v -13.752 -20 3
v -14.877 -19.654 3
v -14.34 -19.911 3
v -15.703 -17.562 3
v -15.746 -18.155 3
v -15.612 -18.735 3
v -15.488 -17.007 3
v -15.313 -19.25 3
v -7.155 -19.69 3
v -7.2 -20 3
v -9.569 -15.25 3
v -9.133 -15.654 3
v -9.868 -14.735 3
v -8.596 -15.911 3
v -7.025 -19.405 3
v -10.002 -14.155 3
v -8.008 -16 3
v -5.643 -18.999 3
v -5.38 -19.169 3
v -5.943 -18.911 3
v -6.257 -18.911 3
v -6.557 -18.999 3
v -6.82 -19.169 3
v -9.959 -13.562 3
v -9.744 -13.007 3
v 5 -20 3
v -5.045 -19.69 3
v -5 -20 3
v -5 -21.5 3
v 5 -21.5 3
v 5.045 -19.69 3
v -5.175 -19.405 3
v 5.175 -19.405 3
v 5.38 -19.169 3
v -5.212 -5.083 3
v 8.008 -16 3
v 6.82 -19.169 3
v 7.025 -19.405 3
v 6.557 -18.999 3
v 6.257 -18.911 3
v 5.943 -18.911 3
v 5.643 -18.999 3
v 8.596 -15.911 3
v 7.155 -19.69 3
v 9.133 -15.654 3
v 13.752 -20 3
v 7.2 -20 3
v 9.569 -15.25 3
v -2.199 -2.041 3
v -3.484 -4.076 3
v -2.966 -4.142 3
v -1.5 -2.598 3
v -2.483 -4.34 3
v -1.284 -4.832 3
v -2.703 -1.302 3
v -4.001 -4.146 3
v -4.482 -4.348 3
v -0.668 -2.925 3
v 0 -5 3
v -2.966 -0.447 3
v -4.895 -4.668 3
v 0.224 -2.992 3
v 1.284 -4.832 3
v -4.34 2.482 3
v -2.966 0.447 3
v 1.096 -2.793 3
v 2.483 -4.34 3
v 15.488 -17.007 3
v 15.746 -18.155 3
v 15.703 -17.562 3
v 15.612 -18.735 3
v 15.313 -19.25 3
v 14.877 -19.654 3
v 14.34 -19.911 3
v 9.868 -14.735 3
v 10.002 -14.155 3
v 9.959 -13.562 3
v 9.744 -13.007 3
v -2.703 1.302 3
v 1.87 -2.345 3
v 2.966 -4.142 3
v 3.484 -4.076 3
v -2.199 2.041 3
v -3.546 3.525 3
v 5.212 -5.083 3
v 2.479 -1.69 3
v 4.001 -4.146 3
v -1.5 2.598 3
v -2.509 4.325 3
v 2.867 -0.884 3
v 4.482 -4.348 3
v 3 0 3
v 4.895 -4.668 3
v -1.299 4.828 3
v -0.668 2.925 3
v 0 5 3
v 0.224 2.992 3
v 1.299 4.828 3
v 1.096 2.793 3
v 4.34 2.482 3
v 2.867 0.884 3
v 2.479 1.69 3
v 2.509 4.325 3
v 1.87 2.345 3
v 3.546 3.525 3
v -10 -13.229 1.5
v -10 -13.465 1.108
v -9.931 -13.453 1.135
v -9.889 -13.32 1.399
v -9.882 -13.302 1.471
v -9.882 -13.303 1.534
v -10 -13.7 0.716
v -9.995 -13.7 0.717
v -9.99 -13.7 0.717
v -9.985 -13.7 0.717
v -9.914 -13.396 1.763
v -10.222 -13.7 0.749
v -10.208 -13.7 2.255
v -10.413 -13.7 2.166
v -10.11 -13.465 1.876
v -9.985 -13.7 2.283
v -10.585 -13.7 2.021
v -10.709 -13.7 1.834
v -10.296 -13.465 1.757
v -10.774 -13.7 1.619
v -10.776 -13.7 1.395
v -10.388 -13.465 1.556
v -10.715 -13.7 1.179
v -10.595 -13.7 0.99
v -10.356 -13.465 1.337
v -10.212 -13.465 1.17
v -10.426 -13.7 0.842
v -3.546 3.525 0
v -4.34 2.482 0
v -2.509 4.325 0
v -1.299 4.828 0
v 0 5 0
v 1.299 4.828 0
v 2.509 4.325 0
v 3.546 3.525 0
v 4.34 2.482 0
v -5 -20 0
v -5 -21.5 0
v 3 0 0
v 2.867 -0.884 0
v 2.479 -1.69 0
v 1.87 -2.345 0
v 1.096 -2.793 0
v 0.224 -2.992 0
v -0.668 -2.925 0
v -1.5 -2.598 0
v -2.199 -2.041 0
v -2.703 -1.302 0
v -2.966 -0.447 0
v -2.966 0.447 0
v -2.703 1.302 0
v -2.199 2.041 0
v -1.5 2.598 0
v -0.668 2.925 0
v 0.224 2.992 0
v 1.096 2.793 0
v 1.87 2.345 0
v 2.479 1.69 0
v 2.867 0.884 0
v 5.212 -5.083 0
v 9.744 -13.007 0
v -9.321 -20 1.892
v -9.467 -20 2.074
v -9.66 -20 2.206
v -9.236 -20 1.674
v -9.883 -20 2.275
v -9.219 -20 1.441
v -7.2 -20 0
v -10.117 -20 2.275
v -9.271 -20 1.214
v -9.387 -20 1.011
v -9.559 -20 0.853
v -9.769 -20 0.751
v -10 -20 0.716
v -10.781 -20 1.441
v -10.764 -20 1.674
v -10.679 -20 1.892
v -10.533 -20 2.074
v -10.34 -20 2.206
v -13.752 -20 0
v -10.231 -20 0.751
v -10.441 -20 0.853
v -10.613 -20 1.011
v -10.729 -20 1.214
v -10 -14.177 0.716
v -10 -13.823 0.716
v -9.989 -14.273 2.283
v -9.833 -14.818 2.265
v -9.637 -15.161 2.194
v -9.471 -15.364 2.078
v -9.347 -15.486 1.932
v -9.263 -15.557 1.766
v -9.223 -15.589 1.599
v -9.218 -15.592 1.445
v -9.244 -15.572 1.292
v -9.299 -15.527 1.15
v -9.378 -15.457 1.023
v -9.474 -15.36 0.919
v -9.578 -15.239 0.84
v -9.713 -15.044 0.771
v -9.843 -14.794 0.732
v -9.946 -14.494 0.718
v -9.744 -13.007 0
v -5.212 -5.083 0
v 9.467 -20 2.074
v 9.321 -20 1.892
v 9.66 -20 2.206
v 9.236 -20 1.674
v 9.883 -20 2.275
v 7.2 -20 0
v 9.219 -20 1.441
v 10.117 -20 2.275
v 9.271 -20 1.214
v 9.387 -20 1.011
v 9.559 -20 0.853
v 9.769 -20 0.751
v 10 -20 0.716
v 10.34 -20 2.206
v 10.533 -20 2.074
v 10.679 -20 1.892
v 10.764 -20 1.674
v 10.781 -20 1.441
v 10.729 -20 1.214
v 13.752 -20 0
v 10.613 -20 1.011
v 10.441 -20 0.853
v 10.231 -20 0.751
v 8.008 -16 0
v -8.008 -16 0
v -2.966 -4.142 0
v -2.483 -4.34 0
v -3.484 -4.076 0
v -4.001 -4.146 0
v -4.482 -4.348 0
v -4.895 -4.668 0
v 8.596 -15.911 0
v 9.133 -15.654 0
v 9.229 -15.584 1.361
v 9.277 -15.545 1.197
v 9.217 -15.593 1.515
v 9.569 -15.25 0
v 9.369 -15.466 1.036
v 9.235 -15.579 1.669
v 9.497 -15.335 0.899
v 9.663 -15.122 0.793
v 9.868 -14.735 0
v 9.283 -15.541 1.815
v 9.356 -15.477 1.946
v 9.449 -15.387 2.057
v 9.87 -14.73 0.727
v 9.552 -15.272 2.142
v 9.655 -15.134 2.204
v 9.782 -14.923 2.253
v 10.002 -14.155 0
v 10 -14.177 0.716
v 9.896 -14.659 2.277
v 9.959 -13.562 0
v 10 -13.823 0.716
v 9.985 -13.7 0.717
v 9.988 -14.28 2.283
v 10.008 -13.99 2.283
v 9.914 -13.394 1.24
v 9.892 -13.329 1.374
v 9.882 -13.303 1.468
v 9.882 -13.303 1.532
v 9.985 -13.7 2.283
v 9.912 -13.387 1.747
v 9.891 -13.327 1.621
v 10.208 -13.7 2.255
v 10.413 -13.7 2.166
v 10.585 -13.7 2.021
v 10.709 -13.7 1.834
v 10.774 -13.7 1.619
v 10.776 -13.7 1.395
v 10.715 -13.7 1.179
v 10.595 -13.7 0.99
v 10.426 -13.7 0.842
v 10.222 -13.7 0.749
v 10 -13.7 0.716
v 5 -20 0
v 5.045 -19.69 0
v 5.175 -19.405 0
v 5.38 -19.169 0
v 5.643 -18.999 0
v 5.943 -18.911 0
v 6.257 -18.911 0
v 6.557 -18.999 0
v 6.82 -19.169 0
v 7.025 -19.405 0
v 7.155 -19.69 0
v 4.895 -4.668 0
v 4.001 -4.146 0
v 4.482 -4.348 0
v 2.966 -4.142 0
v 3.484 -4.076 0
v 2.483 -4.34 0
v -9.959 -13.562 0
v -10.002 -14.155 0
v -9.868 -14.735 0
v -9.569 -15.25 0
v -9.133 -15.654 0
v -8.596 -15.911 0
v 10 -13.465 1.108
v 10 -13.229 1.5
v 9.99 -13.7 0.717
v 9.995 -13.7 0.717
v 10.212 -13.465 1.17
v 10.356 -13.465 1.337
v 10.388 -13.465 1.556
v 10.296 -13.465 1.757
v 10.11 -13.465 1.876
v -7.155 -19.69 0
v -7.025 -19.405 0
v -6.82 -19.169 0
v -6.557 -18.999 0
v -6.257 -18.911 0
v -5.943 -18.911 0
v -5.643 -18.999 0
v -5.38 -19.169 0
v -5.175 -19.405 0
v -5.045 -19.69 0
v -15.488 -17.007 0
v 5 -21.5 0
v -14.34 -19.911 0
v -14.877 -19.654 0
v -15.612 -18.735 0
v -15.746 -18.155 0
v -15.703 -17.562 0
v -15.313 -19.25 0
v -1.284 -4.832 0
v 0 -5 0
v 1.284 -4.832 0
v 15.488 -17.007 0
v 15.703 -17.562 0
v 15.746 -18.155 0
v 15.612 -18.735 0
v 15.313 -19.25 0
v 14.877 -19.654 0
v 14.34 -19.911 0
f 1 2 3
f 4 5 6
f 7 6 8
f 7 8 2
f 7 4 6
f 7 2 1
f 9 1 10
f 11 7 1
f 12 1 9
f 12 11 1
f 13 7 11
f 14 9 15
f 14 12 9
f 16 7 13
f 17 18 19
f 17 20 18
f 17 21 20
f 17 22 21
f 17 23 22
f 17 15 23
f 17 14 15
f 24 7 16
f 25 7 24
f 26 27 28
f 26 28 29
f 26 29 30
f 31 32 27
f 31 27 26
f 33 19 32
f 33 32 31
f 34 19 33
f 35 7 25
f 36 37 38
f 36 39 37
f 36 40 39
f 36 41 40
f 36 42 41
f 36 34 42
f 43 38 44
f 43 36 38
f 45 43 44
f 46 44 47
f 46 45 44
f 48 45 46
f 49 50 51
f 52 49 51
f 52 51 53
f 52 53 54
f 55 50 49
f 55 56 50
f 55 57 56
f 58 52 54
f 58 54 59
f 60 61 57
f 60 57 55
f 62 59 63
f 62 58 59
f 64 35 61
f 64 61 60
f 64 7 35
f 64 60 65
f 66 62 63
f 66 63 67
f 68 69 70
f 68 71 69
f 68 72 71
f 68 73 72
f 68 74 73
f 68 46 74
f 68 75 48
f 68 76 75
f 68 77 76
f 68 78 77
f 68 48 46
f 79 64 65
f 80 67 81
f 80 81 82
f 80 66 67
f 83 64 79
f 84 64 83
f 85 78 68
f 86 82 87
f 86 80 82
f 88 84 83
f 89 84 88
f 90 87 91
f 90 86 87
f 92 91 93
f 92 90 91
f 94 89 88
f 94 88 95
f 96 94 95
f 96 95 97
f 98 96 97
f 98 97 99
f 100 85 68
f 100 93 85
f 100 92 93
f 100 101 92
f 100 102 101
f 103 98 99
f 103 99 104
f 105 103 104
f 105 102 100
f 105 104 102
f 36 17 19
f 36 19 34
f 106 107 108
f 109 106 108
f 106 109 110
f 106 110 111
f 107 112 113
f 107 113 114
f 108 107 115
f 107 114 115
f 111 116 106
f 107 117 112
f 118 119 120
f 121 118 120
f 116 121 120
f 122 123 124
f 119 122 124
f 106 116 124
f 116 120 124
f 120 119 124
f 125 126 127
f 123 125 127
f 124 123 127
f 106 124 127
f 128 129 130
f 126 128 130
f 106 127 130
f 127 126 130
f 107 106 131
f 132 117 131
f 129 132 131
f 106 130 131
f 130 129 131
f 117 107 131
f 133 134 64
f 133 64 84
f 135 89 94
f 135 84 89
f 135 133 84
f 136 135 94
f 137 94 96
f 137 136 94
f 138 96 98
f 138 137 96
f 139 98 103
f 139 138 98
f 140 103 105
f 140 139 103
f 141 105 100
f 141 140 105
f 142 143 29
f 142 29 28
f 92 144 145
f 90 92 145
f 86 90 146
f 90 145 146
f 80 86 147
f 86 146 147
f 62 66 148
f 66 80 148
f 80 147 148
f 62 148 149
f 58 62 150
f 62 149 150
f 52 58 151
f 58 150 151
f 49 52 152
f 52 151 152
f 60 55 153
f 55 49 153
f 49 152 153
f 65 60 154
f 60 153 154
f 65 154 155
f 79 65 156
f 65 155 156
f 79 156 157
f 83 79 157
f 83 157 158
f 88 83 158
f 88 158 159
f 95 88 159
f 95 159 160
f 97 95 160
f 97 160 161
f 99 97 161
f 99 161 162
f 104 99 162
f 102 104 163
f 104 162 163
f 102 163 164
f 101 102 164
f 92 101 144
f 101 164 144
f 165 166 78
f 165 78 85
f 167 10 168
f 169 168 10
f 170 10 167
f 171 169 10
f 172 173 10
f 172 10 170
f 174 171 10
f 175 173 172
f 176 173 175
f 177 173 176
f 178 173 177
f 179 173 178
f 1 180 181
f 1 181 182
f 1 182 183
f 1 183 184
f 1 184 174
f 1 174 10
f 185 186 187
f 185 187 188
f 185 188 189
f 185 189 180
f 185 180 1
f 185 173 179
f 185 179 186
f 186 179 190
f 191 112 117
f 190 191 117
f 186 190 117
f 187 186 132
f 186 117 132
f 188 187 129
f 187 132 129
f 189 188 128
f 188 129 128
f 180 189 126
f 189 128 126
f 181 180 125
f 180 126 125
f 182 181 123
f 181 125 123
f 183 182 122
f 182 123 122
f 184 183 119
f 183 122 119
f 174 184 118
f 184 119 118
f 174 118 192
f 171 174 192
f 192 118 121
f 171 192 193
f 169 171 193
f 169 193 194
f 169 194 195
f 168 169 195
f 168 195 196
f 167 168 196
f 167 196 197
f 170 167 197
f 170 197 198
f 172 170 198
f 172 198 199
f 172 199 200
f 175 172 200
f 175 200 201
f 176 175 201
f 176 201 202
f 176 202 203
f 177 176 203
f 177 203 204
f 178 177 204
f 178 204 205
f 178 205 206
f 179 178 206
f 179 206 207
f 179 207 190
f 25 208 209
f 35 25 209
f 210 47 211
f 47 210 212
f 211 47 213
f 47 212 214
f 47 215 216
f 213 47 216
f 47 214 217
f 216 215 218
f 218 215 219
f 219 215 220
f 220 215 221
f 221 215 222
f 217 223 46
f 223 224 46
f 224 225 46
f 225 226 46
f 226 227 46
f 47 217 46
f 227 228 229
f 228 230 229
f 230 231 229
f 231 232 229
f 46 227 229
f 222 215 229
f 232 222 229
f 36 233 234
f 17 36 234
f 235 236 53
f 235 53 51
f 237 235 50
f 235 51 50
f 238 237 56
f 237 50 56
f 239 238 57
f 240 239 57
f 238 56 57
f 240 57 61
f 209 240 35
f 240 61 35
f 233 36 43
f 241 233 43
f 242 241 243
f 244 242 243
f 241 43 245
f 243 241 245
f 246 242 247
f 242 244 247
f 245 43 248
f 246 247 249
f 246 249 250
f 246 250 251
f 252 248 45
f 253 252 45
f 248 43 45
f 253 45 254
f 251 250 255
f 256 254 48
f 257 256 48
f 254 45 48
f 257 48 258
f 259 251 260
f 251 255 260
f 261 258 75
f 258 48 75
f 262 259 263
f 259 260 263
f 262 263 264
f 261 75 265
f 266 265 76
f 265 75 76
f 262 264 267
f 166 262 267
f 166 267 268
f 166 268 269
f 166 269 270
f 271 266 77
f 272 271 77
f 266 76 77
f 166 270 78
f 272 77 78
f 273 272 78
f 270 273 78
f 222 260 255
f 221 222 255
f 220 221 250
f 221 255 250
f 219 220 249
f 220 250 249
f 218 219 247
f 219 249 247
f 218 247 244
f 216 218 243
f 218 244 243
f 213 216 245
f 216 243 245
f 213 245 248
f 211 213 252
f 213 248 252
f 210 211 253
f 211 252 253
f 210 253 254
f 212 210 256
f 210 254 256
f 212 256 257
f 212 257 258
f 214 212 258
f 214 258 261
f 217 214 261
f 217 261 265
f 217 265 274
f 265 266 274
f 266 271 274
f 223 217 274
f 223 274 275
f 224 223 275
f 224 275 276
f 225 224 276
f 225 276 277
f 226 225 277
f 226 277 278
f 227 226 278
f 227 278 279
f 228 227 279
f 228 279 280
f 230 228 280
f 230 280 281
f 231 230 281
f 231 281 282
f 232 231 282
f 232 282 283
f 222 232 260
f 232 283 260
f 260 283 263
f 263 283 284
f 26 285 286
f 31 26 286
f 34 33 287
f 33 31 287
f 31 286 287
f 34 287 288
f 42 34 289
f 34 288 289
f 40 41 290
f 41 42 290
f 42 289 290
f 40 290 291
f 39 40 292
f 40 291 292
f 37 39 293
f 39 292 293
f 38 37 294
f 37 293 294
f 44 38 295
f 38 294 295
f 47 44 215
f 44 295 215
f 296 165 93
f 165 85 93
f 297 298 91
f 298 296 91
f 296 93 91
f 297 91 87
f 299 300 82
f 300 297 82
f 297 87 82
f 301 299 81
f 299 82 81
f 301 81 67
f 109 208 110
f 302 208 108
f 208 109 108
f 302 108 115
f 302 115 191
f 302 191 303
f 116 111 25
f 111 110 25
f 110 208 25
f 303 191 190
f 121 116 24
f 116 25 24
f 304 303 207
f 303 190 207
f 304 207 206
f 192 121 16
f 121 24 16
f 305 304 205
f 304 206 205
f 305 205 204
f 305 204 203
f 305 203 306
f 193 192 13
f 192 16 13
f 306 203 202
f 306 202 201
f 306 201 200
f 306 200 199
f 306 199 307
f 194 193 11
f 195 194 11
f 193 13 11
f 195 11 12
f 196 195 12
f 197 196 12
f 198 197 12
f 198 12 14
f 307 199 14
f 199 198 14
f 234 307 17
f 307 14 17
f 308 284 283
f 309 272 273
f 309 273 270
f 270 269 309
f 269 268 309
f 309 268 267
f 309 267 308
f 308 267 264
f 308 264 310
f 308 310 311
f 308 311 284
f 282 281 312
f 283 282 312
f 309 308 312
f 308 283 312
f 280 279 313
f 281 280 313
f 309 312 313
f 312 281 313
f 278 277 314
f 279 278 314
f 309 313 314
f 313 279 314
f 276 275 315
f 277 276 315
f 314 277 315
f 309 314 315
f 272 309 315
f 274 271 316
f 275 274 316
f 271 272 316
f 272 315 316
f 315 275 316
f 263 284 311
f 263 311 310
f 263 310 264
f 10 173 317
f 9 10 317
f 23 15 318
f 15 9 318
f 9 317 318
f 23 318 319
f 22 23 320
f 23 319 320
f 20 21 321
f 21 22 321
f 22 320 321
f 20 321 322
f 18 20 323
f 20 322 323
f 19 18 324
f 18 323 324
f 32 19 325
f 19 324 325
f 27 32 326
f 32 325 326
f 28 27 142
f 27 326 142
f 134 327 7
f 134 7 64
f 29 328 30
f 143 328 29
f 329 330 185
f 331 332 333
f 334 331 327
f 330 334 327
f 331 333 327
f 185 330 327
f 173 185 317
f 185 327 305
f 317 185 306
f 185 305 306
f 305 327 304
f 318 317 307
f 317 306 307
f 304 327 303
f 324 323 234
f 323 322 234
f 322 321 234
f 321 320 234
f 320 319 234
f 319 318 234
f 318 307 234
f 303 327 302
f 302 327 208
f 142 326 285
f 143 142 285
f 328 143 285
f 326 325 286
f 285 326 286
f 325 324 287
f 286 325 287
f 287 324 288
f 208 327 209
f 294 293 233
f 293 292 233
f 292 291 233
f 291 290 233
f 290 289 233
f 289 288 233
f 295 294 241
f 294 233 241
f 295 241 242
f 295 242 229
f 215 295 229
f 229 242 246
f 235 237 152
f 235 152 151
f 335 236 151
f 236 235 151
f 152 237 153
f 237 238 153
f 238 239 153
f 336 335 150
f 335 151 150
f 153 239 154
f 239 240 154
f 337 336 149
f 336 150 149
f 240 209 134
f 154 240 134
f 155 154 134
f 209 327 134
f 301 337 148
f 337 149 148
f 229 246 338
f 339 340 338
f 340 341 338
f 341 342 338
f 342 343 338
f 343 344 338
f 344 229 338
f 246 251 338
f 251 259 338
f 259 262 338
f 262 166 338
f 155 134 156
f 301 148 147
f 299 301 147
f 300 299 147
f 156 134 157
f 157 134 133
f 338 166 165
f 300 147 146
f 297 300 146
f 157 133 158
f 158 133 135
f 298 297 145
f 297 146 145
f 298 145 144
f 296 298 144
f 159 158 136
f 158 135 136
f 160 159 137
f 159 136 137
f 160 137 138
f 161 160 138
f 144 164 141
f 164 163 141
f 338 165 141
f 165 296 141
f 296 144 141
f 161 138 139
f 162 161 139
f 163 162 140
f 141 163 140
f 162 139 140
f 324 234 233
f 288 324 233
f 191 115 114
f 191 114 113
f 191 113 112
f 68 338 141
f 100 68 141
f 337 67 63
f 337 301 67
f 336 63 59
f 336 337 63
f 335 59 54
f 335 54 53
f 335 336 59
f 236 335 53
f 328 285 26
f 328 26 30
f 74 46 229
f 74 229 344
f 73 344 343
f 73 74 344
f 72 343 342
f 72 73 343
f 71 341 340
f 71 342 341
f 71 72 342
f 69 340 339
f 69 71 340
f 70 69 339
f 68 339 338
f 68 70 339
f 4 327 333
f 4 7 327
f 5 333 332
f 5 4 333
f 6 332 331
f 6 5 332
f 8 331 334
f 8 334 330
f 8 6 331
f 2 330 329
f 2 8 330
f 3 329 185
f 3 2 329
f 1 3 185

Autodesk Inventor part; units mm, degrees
ref_plane "YZ Plane" through (0, 0, 0) normal (1, 0, 0) x (0, 1, 0)
ref_plane "XZ Plane" through (0, 0, 0) normal (0, 1, 0) x (-1, 0, 0)
ref_plane "XY Plane" through (0, 0, 0) normal (0, 0, 1) x (1, 0, 0)
sketch "スケッチ1" plane through (0, 0, 0) normal (0, 0, 1) x (1, 0, 0)
  circle A0 centre (0, 0) radius 3
  circle A1 centre (0, 0) radius 5
  line L0 (-5, -20) -> (5, -20)
  line L1 (5, -20) -> (5, -21.5)
  line L2 (5, -21.5) -> (-5, -21.5)
  line L3 (-5, -21.5) -> (-5, -20)
  circle A2 centre (-6.1, -20) radius 1.1
  line L4 (0, 0) -> (0, -20) construction
  circle A3 centre (6.1, -20) radius 1.1
  line L5 (-7.2, -20) -> (-17.2, -20)
  line L6 (-17.2, -20) -> (-4.3402, 2.4825)
  line L7 (7.2, -20) -> (17.2, -20)
  line L8 (17.2, -20) -> (4.3402, 2.4825)
  point P0 (0, -21.5)
  point P1 (4.3402, 2.4825)
  dimension "d1" = 10
  dimension "d0" = 6
  dimension "d2" = 10
  dimension "d3" = 1.5
  dimension "d4" = 2.2
  dimension "d5" = 20
  dimension "d6" = 10
extrude "押し出し1" add sketch "スケッチ1" along normal blind 3 contours A1 | A1 L8 L7 A3 L0 A2 L5 L6 | L1 L2 L3 L0
fillet "フィレット1" radius 2 2 edges at (-17.2, -20, 1.5) (17.2, -20, 1.5)
sketch "スケッチ3" plane through (0, 0, 0) normal (0, 0, -1) x (-1, 0, 0)
  arc A0 (-15.488, -17.007) -> (-13.752, -20) centre (-13.752, -18) ccw projected
  line L0 (-7.2, -20) -> (-13.752, -20) projected
  arc A1 (-5, -20) -> (-7.2, -20) centre (-6.1, -20) ccw projected
  line L1 (-5, -21.5) -> (-5, -20) projected
  line L2 (5, -21.5) -> (-5, -21.5) projected
  line L3 (5, -20) -> (5, -21.5) projected
  arc A2 (7.2, -20) -> (5, -20) centre (6.1, -20) ccw projected
  line L4 (13.752, -20) -> (7.2, -20) projected
  arc A3 (13.752, -20) -> (15.488, -17.007) centre (13.752, -18) ccw projected
  line L5 (4.3402, 2.4825) -> (15.488, -17.007) projected
  arc A4 (4.3402, 2.4825) -> (-4.3402, 2.4825) centre (0, 0) ccw projected
  line L6 (-15.488, -17.007) -> (-4.3402, 2.4825) projected
  circle A5 centre (0, 0) radius 3 projected
  line L7 (-11.4559, -16) -> (11.4559, -16)
  line L8 (11.4559, -16) -> (4.0113, -2.9848)
  line L9 (-11.4559, -16) -> (-4.0113, -2.9848)
  line L10 (-15.488, -17.007) -> (-4.3402, 2.4825) projected
  circle A6 centre (0, 0) radius 5
  line L11 (5, -21.5) -> (-5, -21.5) projected
  arc A7 (4.3402, 2.4825) -> (-4.3402, 2.4825) centre (0, 0) ccw projected
  point P0 (0, -21.5)
  point P1 (0, -16)
  point P2 (0, -21.5)
  dimension "d19" = 4
  dimension "d20" = 3
extrude "押し出し2" cut sketch "スケッチ3" against normal through all contours A6 L8 L7 L9
fillet "フィレット2" radius 2 4 edges at (-4.0113, -2.9848, 1.5) (4.0113, -2.9848, 1.5) (-11.4559, -16, 1.5) (11.4559, -16, 1.5)
sketch "スケッチ2" plane through (-17.2, -20, 0) normal (0, -1, 0) x (1, 0, 0)
  line L0 (12.2, 0) -> (12.2, 3) projected
  line L1 (22.2, 0) -> (22.2, 3) projected
  point P0 (17.2, 0)
  point P1 (7.2, 1.5)
  point P2 (27.2, 1.5)
  point P3 (12.2, 1.5)
  point P4 (22.2, 1.5)
  point P5 (12.2, 1.5)
  point P6 (22.2, 1.5)
  dimension "d9" = 5
  dimension "d10" = 5
hole "穴1" at (-10, -20, 1.5) at (10, -20, 1.5) direction (0, 1, 0) diameter 1.567 depth 6.3 tip angle 118 thread size "M2x0.4" class "6H" standard "ISO Metric profile"
sketch "スケッチ4" plane through (0, 0, 0) normal (0, 0, -1) x (-1, 0, 0)
  line L0 (5.405, -15.9) -> (-14.4109, -15.9) construction
  arc A0 (-15.5215, -12.2367) -> (-14.4109, -15.9) centre (-14.4109, -13.9) ccw construction
  line L1 (-15.5215, -12.2367) -> (-4.1487, -4.643) construction
  arc A1 (-2.1701, -4.5045) -> (-4.1487, -4.643) centre (-3.0381, -6.3063) ccw construction
  arc A2 (-2.1701, -4.5045) -> (2.4825, -4.3402) centre (0, 0) ccw construction
  arc A3 (5.2116, -5.0832) -> (2.4825, -4.3402) centre (3.4756, -6.0762) ccw construction
  line L2 (5.2116, -5.0832) -> (7.3308, -8.7882) construction
  arc A4 (7.377, -10.6888) -> (7.3308, -8.7882) centre (5.5948, -9.7812) ccw projected
  arc A5 (7.377, -10.6888) -> (7.2631, -13.1601) centre (10.0503, -12.0503) ccw projected
  arc A6 (5.405, -15.9) -> (7.2631, -13.1601) centre (5.405, -13.9) ccw projected
  line L3 (4.3402, 2.4825) -> (9.529, -6.589) construction
  arc A7 (4.3402, 2.4825) -> (0, 5) centre (0, 0) ccw construction
  line L4 (-8, 5) -> (0, 5) construction
  arc A8 (-8, 5) -> (-10.7765, 4.1583) centre (-8, 0) ccw construction
  line L5 (-33.2416, -10.8417) -> (-10.7765, 4.1583) construction
  arc A9 (-33.2416, -10.8417) -> (-30.4651, -20) centre (-30.4651, -15) ccw construction
  line L6 (-7.2, -20) -> (-30.4651, -20) construction
  arc A10 (-5, -20) -> (-7.2, -20) centre (-6.1, -20) ccw construction
  line L7 (-5, -21.5) -> (-5, -20) construction
  line L8 (5, -21.5) -> (-5, -21.5) construction
  line L9 (5, -20) -> (5, -21.5) construction
  arc A11 (7.2, -20) -> (5, -20) centre (6.1, -20) ccw construction
  line L10 (15, -20) -> (7.2, -20) projected
  arc A12 (15, -20) -> (17.1213, -19.1213) centre (15, -17) ccw projected
  line L11 (17.1213, -19.1213) -> (22.0711, -14.1716) projected
  arc A13 (22.0711, -14.1716) -> (22.0711, -9.9289) centre (19.9497, -12.0503) ccw projected
  arc A14 (22.0711, -9.9289) -> (11.8876, -7.4967) centre (15, -17) ccw projected
  arc A15 (9.529, -6.589) -> (11.8876, -7.4967) centre (11.2651, -5.596) ccw projected
  arc A16 (9.2724, -11.2724) -> (10.8281, -12.8281) centre (10.0503, -12.0503) ccw projected
  arc A17 (20.7276, -11.2724) -> (9.2724, -11.2724) centre (15, -17) ccw projected
  arc A18 (19.1719, -12.8281) -> (20.7276, -11.2724) centre (19.9497, -12.0503) ccw projected
  arc A19 (19.1719, -12.8281) -> (10.8281, -12.8281) centre (15, -17) ccw projected
  line L12 (-9.6659, 2.495) -> (-32.131, -12.505) construction
  arc A20 (-6.3341, -2.495) -> (-9.6659, 2.495) centre (-8, 0) ccw construction
  line L13 (-28.7992, -17.495) -> (-6.3341, -2.495) construction
  arc A21 (-32.131, -12.505) -> (-28.7992, -17.495) centre (-30.4651, -15) ccw construction
  circle A22 centre (0, 0) radius 3 construction
  circle A23 centre (15, -17) radius 1.1 projected
  line L14 (5.405, -15.9) -> (5.405, -16)
  line L15 (8.0079, -16) -> (-8.0079, -16) projected
  arc A24 (-2.4825, -4.3402) -> (2.4825, -4.3402) centre (0, 0) ccw projected
  arc A25 (5.2116, -5.0832) -> (2.4825, -4.3402) centre (3.4756, -6.0762) ccw projected
  line L16 (5.2116, -5.0832) -> (9.744, -13.007) projected
  arc A26 (8.0079, -16) -> (9.744, -13.007) centre (8.0079, -14) ccw projected
  line L17 (8.0079, -16) -> (-8.0079, -16) projected
  arc A27 (-9.744, -13.007) -> (-8.0079, -16) centre (-8.0079, -14) ccw projected
  line L18 (-9.744, -13.007) -> (-5.2116, -5.0832) projected
  arc A28 (-2.4825, -4.3402) -> (-5.2116, -5.0832) centre (-3.4756, -6.0762) ccw projected
  arc A29 (-15.488, -17.007) -> (-13.752, -20) centre (-13.752, -18) ccw projected
  line L19 (-7.2, -20) -> (-13.752, -20) projected
  arc A30 (-5, -20) -> (-7.2, -20) centre (-6.1, -20) ccw projected
  line L20 (-5, -21.5) -> (-5, -20) projected
  line L21 (5, -21.5) -> (-5, -21.5) projected
  line L22 (5, -20) -> (5, -21.5) projected
  arc A31 (7.2, -20) -> (5, -20) centre (6.1, -20) ccw projected
  line L23 (13.752, -20) -> (7.2, -20) projected
  arc A32 (13.752, -20) -> (15.488, -17.007) centre (13.752, -18) ccw projected
  line L24 (4.3402, 2.4825) -> (15.488, -17.007) projected
  arc A33 (4.3402, 2.4825) -> (-4.3402, 2.4825) centre (0, 0) ccw projected
  line L25 (-15.488, -17.007) -> (-4.3402, 2.4825) projected
  circle A34 centre (0, 0) radius 3 projected
  point P0 (9.529, -6.589)
  point P1 (11.3484, -9.7698)
  point P2 (12.4427, -11.683)
  point P3 (14.86, -15.909)
  point P4 (15.743, -17.8111)
  point P5 (9.8052, -13.1226)
  point P6 (9.0034, -11.7124)
  point P7 (7.3308, -8.7882)
sketch "スケッチ5" plane through (0, 0, 0) normal (0, 0, -1) x (-1, 0, 0)
  circle A0 centre (15, -17) radius 2 projected
  arc A1 (20.7276, -11.2724) -> (9.2724, -11.2724) centre (15, -17) ccw projected
  arc A2 (9.2724, -11.2724) -> (10.8281, -12.8281) centre (10.0503, -12.0503) ccw projected
  arc A3 (19.1719, -12.8281) -> (10.8281, -12.8281) centre (15, -17) ccw projected
  arc A4 (19.1719, -12.8281) -> (20.7276, -11.2724) centre (19.9497, -12.0503) ccw projected
  arc A5 (18.5355, -13.4645) -> (11.4645, -13.4645) centre (15, -17) ccw projected
  arc A6 (8.636, -10.636) -> (11.4645, -13.4645) centre (10.0503, -12.0503) ccw projected
  arc A7 (21.364, -10.636) -> (8.636, -10.636) centre (15, -17) ccw projected
  arc A8 (18.5355, -13.4645) -> (21.364, -10.636) centre (19.9497, -12.0503) ccw projected
  point P0 (0, 0)
equation "\"d10\" = d9"
properties part number "kosipiti" material "アルミニウム 2014-T4"
